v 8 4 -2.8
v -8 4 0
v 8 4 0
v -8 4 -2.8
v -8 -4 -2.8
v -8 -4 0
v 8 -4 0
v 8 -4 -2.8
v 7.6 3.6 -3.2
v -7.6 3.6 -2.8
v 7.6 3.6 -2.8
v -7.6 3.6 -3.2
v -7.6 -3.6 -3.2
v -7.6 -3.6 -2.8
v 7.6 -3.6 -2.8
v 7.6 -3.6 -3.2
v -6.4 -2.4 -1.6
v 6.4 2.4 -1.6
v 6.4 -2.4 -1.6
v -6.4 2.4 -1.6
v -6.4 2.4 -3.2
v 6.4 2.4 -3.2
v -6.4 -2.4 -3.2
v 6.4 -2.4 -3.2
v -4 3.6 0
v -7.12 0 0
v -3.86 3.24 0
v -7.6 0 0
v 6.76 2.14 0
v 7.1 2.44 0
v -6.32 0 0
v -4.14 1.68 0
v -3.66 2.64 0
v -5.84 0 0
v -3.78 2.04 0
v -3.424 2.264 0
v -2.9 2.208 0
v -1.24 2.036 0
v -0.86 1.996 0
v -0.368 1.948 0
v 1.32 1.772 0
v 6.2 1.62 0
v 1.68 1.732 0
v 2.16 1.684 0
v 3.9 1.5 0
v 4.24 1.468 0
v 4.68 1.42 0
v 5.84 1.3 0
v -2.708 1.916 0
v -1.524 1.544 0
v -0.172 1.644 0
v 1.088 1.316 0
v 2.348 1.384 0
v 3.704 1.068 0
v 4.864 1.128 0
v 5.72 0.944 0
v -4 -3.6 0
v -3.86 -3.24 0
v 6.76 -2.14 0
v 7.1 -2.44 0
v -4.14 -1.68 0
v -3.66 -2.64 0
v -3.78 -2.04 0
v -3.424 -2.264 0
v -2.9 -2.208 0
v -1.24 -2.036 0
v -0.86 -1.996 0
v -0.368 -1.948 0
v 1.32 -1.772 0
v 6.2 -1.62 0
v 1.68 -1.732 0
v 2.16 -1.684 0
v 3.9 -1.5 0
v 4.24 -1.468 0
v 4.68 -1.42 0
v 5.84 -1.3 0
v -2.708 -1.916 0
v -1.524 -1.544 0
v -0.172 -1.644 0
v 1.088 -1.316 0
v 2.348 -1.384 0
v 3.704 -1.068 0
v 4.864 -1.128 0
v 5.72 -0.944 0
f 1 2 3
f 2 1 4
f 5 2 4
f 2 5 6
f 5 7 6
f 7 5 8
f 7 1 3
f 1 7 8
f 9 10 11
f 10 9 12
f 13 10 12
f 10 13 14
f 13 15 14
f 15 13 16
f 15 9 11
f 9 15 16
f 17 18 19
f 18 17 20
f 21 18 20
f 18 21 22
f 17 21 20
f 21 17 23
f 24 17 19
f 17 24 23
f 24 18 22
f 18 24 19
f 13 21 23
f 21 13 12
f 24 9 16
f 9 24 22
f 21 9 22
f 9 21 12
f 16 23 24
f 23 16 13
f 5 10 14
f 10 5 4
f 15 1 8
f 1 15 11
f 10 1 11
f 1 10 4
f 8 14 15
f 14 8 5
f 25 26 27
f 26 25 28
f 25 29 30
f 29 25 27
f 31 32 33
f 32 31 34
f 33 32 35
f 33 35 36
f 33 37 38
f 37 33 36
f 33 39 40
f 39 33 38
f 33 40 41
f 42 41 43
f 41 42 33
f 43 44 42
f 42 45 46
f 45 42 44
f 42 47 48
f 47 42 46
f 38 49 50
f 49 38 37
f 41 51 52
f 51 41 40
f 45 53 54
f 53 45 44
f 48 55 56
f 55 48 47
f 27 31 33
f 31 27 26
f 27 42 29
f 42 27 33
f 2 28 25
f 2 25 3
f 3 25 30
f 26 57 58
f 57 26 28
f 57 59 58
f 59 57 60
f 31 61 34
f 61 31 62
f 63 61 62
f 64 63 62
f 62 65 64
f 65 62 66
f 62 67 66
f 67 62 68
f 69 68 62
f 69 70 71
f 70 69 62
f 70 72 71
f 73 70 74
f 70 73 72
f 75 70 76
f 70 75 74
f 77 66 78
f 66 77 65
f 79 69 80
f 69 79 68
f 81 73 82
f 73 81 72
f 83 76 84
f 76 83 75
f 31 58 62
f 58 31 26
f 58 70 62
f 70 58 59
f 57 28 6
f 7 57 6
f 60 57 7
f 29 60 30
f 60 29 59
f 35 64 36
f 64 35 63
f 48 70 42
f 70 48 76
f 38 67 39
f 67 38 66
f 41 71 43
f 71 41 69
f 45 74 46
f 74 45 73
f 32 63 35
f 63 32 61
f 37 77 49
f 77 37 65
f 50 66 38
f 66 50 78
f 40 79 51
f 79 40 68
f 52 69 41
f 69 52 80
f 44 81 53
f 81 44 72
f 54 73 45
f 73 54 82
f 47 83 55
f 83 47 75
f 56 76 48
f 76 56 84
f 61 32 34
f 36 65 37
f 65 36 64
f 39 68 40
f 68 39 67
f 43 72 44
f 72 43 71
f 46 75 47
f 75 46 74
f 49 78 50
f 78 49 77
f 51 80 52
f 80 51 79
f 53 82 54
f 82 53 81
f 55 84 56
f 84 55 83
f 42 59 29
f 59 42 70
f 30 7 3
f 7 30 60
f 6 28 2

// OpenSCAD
// file: ../p/box5.scad
use <../lib.scad>
function ldraw_lib__box5() = [
// 0 Box with 5 Faces and All Edges
// 0 Name: box5.dat
// 0 Author: James Jessiman
// 0 !LDRAW_ORG Primitive UPDATE 2012-01
// 0 !LICENSE Licensed under CC BY 4.0 : see CAreadme.txt
// 
// 0 BFC CERTIFY CCW
  [0,"BFC","CERTIFY"],
  [0,"BFC","CCW"],
// 
// 0 !HISTORY 2002-04-03 [sbliss] Modified for BFC compliance
// 0 !HISTORY 2002-04-25 [PTadmin] Official Update 2002-02
// 0 !HISTORY 2007-06-24 [PTadmin] Header formatted for Contributor Agreement
// 0 !HISTORY 2008-07-01 [PTadmin] Official Update 2008-01
// 0 !HISTORY 2012-02-16 [Philo] Changed to CCW
// 0 !HISTORY 2012-03-30 [PTadmin] Official Update 2012-01
// 
// 
// 2 24 1 1 1 -1 1 1
  [2,24,1,1,1,-1,1,1],
// 2 24 -1 1 1 -1 1 -1
  [2,24,-1,1,1,-1,1,-1],
// 2 24 -1 1 -1 1 1 -1
  [2,24,-1,1,-1,1,1,-1],
// 2 24 1 1 -1 1 1 1
  [2,24,1,1,-1,1,1,1],
// 2 24 1 0 1 -1 0 1
  [2,24,1,0,1,-1,0,1],
// 2 24 -1 0 1 -1 0 -1
  [2,24,-1,0,1,-1,0,-1],
// 2 24 -1 0 -1 1 0 -1
  [2,24,-1,0,-1,1,0,-1],
// 2 24 1 0 -1 1 0 1
  [2,24,1,0,-1,1,0,1],
// 2 24 1 0 1 1 1 1
  [2,24,1,0,1,1,1,1],
// 2 24 -1 0 1 -1 1 1
  [2,24,-1,0,1,-1,1,1],
// 2 24 1 0 -1 1 1 -1
  [2,24,1,0,-1,1,1,-1],
// 2 24 -1 0 -1 -1 1 -1
  [2,24,-1,0,-1,-1,1,-1],
// 4 16 -1 1 1 1 1 1 1 1 -1 -1 1 -1
  [4,16,-1,1,1,1,1,1,1,1,-1,-1,1,-1],
// 4 16 -1 1 1 -1 0 1 1 0 1 1 1 1
  [4,16,-1,1,1,-1,0,1,1,0,1,1,1,1],
// 4 16 -1 1 -1 -1 0 -1 -1 0 1 -1 1 1
  [4,16,-1,1,-1,-1,0,-1,-1,0,1,-1,1,1],
// 4 16 1 1 -1 1 0 -1 -1 0 -1 -1 1 -1
  [4,16,1,1,-1,1,0,-1,-1,0,-1,-1,1,-1],
// 4 16 1 1 1 1 0 1 1 0 -1 1 1 -1
  [4,16,1,1,1,1,0,1,1,0,-1,1,1,-1],
];
module ldraw_lib__box5(step=0, col=false, unit=2/5, alt=false, line=0.2, solid=!$preview)
    makepoly(ldraw_lib__box5(), step=step, col=col, unit=unit, alt=alt, line=line, solid=solid);
ldraw_lib__box5(line=0.2);
// file: ../p/box4.scad
use <../lib.scad>
function ldraw_lib__box4() = [
// 0 Box with 4 Faces (2 Parallel Pairs) and All Edges
// 0 Name: box4.dat
// 0 Author: James Jessiman
// 0 !LDRAW_ORG Primitive UPDATE 2012-01
// 0 !LICENSE Licensed under CC BY 4.0 : see CAreadme.txt
// 
// 0 BFC CERTIFY CCW
  [0,"BFC","CERTIFY"],
  [0,"BFC","CCW"],
// 
// 0 !HISTORY 2002-04-03 [sbliss] Modified for BFC compliance
// 0 !HISTORY 2002-04-25 [PTadmin] Official Update 2002-02
// 0 !HISTORY 2007-06-24 [PTadmin] Header formatted for Contributor Agreement
// 0 !HISTORY 2008-07-01 [PTadmin] Official Update 2008-01
// 0 !HISTORY 2012-02-16 [Philo] Changed to CCW
// 0 !HISTORY 2012-03-30 [PTadmin] Official Update 2012-01
// 
// 
// 2 24 1 1 1 -1 1 1
  [2,24,1,1,1,-1,1,1],
// 2 24 -1 1 1 -1 1 -1
  [2,24,-1,1,1,-1,1,-1],
// 2 24 -1 1 -1 1 1 -1
  [2,24,-1,1,-1,1,1,-1],
// 2 24 1 1 -1 1 1 1
  [2,24,1,1,-1,1,1,1],
// 2 24 1 0 1 -1 0 1
  [2,24,1,0,1,-1,0,1],
// 2 24 -1 0 1 -1 0 -1
  [2,24,-1,0,1,-1,0,-1],
// 2 24 -1 0 -1 1 0 -1
  [2,24,-1,0,-1,1,0,-1],
// 2 24 1 0 -1 1 0 1
  [2,24,1,0,-1,1,0,1],
// 2 24 1 0 1 1 1 1
  [2,24,1,0,1,1,1,1],
// 2 24 -1 0 1 -1 1 1
  [2,24,-1,0,1,-1,1,1],
// 2 24 1 0 -1 1 1 -1
  [2,24,1,0,-1,1,1,-1],
// 2 24 -1 0 -1 -1 1 -1
  [2,24,-1,0,-1,-1,1,-1],
// 4 16 -1 1 1 -1 0 1 1 0 1 1 1 1
  [4,16,-1,1,1,-1,0,1,1,0,1,1,1,1],
// 4 16 -1 1 -1 -1 0 -1 -1 0 1 -1 1 1
  [4,16,-1,1,-1,-1,0,-1,-1,0,1,-1,1,1],
// 4 16 1 1 -1 1 0 -1 -1 0 -1 -1 1 -1
  [4,16,1,1,-1,1,0,-1,-1,0,-1,-1,1,-1],
// 4 16 1 1 1 1 0 1 1 0 -1 1 1 -1
  [4,16,1,1,1,1,0,1,1,0,-1,1,1,-1],
];
module ldraw_lib__box4(step=0, col=false, unit=2/5, alt=false, line=0.2, solid=!$preview)
    makepoly(ldraw_lib__box4(), step=step, col=col, unit=unit, alt=alt, line=line, solid=solid);
ldraw_lib__box4(line=0.2);
// file: s/3069bs01.scad
use <../../lib.scad>
use <../../p/box4.scad>
use <../../p/box5.scad>
function ldraw_lib__s__3069bs01() = [
// 0 ~Tile  1 x  2 with Groove without Top Face
// 0 Name: s\3069bs01.dat
// 0 Author: Santeri Piippo [arezey]
// 0 !LDRAW_ORG Subpart UPDATE 2010-02
// 0 !LICENSE Licensed under CC BY 4.0 : see CAreadme.txt
// 
// 0 BFC CERTIFY CCW
  [0,"BFC","CERTIFY"],
  [0,"BFC","CCW"],
// 
// 0 !HISTORY 2010-07-05 [PTadmin] Official Update 2010-02
// 
// 
// 1 16 0 0 0 20 0 0 0 7 0 0 0 10 box4.dat
  [1,16,0,0,0,20,0,0,0,7,0,0,0,10, ldraw_lib__box4()],
// 1 16 0 7 0 19 0 0 0 1 0 0 0 9 box4.dat
  [1,16,0,7,0,19,0,0,0,1,0,0,0,9, ldraw_lib__box4()],
// 0 BFC INVERTNEXT
  [0,"BFC","INVERTNEXT"],
// 1 16 0 8 0 16 0 0 0 -4 0 0 0 6 box5.dat
  [1,16,0,8,0,16,0,0,0,-4,0,0,0,6, ldraw_lib__box5()],
// 4 16 -19 8 9 -16 8 6 -16 8 -6 -19 8 -9
  [4,16,-19,8,9,-16,8,6,-16,8,-6,-19,8,-9],
// 4 16 19 8 -9 16 8 -6 16 8 6 19 8 9
  [4,16,19,8,-9,16,8,-6,16,8,6,19,8,9],
// 4 16 19 8 9 16 8 6 -16 8 6 -19 8 9
  [4,16,19,8,9,16,8,6,-16,8,6,-19,8,9],
// 4 16 -19 8 -9 -16 8 -6 16 8 -6 19 8 -9
  [4,16,-19,8,-9,-16,8,-6,16,8,-6,19,8,-9],
// 4 16 -20 7 10 -19 7 9 -19 7 -9 -20 7 -10
  [4,16,-20,7,10,-19,7,9,-19,7,-9,-20,7,-10],
// 4 16 20 7 -10 19 7 -9 19 7 9 20 7 10
  [4,16,20,7,-10,19,7,-9,19,7,9,20,7,10],
// 4 16 20 7 10 19 7 9 -19 7 9 -20 7 10
  [4,16,20,7,10,19,7,9,-19,7,9,-20,7,10],
// 4 16 -20 7 -10 -19 7 -9 19 7 -9 20 7 -10
  [4,16,-20,7,-10,-19,7,-9,19,7,-9,20,7,-10],
// 0 //
];
module ldraw_lib__s__3069bs01(step=0, col=false, unit=2/5, alt=false, line=0.2, solid=!$preview)
    makepoly(ldraw_lib__s__3069bs01(), step=step, col=col, unit=unit, alt=alt, line=line, solid=solid);
ldraw_lib__s__3069bs01(line=0.2);
// file: s/3069bp0os01.scad
use <../../lib.scad>
function ldraw_lib__s__3069bp0os01() = [
// 0 ~Tile  1 x  2 with Black Pentagonal Outlines and Light Bluish Grey and Dark Bluish Grey Vents Pattern - Half
// 0 Name: s\3069bp0os01.dat
// 0 Author: Vincent Messenet [Cheenzo]
// 0 !LDRAW_ORG Subpart UPDATE 2024-05
// 0 !LICENSE Licensed under CC BY 4.0 : see CAreadme.txt
// 
// 0 BFC CERTIFY CCW
  [0,"BFC","CERTIFY"],
  [0,"BFC","CCW"],
// 
// 0 !HISTORY 2024-06-30 [OrionP] Official Update 2024-05
// 
// 
// 4 0 -19 0 0 -17.8 0 0 -9.65 0 8.1 -10 0 9
  [4,0,-19,0,0,-17.8,0,0,-9.65,0,8.1,-10,0,9],
// 4 0 -10 0 9 -9.65 0 8.1 16.9 0 5.35 17.75 0 6.1
  [4,0,-10,0,9,-9.65,0,8.1,16.9,0,5.35,17.75,0,6.1],
// 4 0 -15.8 0 0 -14.6 0 0 -10.35 0 4.2 -9.15 0 6.6
  [4,0,-15.8,0,0,-14.6,0,0,-10.35,0,4.2,-9.15,0,6.6],
// 3 0 -9.15 0 6.6 -10.35 0 4.2 -9.45 0 5.1
  [3,0,-9.15,0,6.6,-10.35,0,4.2,-9.45,0,5.1],
// 3 0 -9.15 0 6.6 -9.45 0 5.1 -8.56 0 5.66
  [3,0,-9.15,0,6.6,-9.45,0,5.1,-8.56,0,5.66],
// 4 0 -8.56 0 5.66 -7.25 0 5.52 -3.1 0 5.09 -9.15 0 6.6
  [4,0,-8.56,0,5.66,-7.25,0,5.52,-3.1,0,5.09,-9.15,0,6.6],
// 4 0 -.92 0 4.87 -9.15 0 6.6 -3.1 0 5.09 -2.15 0 4.99
  [4,0,-.92,0,4.87,-9.15,0,6.6,-3.1,0,5.09,-2.15,0,4.99],
// 3 0 -9.15 0 6.6 -.92 0 4.87 3.3 0 4.43
  [3,0,-9.15,0,6.6,-.92,0,4.87,3.3,0,4.43],
// 4 0 -9.15 0 6.6 3.3 0 4.43 4.2 0 4.33 15.5 0 4.05
  [4,0,-9.15,0,6.6,3.3,0,4.43,4.2,0,4.33,15.5,0,4.05],
// 3 0 4.2 0 4.33 5.4 0 4.21 15.5 0 4.05
  [3,0,4.2,0,4.33,5.4,0,4.21,15.5,0,4.05],
// 4 0 10.6 0 3.67 15.5 0 4.05 5.4 0 4.21 9.75 0 3.75
  [4,0,10.6,0,3.67,15.5,0,4.05,5.4,0,4.21,9.75,0,3.75],
// 4 0 10.6 0 3.67 11.7 0 3.55 14.6 0 3.25 15.5 0 4.05
  [4,0,10.6,0,3.67,11.7,0,3.55,14.6,0,3.25,15.5,0,4.05],
// 4 72 -7.25 0 5.52 -6.77 0 4.79 -3.81 0 3.86 -3.1 0 5.09
  [4,72,-7.25,0,5.52,-6.77,0,4.79,-3.81,0,3.86,-3.1,0,5.09],
// 4 72 -.92 0 4.87 -.43 0 4.11 2.72 0 3.29 3.3 0 4.43
  [4,72,-.92,0,4.87,-.43,0,4.11,2.72,0,3.29,3.3,0,4.43],
// 4 72 9.75 0 3.75 5.4 0 4.21 5.87 0 3.46 9.26 0 2.67
  [4,72,9.75,0,3.75,5.4,0,4.21,5.87,0,3.46,9.26,0,2.67],
// 4 72 11.7 0 3.55 12.16 0 2.82 14.3 0 2.36 14.6 0 3.25
  [4,72,11.7,0,3.55,12.16,0,2.82,14.3,0,2.36,14.6,0,3.25],
// 4 16 -17.8 0 0 -15.8 0 0 -9.15 0 6.6 -9.65 0 8.1
  [4,16,-17.8,0,0,-15.8,0,0,-9.15,0,6.6,-9.65,0,8.1],
// 4 16 -9.65 0 8.1 -9.15 0 6.6 15.5 0 4.05 16.9 0 5.35
  [4,16,-9.65,0,8.1,-9.15,0,6.6,15.5,0,4.05,16.9,0,5.35],
// 3 16 -20 0 10 -19 0 0 -10 0 9
  [3,16,-20,0,10,-19,0,0,-10,0,9],
// 3 16 -20 0 10 -10 0 9 20 0 10
  [3,16,-20,0,10,-10,0,9,20,0,10],
// 3 16 20 0 10 -10 0 9 17.75 0 6.1
  [3,16,20,0,10,-10,0,9,17.75,0,6.1],
];
module ldraw_lib__s__3069bp0os01(step=0, col=false, unit=2/5, alt=false, line=0.2, solid=!$preview)
    makepoly(ldraw_lib__s__3069bp0os01(), step=step, col=col, unit=unit, alt=alt, line=line, solid=solid);
ldraw_lib__s__3069bp0os01(line=0.2);
// main file
use <../lib.scad>
use <s/3069bp0os01.scad>
use <s/3069bs01.scad>
function ldraw_lib__3069bp0o() = [
// 0 Tile  1 x  2 with Black Pentagonal Outlines and Light Bluish Grey and Dark Bluish Grey Vents Pattern
// 0 Name: 3069bp0o.dat
// 0 Author: Vincent Messenet [Cheenzo]
// 0 !LDRAW_ORG Part UPDATE 2024-05
// 0 !LICENSE Licensed under CC BY 4.0 : see CAreadme.txt
// 
// 0 BFC CERTIFY CCW
  [0,"BFC","CERTIFY"],
  [0,"BFC","CCW"],
// 
// 0 !KEYWORDS Bricklink 3069bpb1082, BrickOwl 1097905, Optimus Prime
// 0 !KEYWORDS Rebrickable 3069bpr0352, Set 10302
// 
// 0 !HISTORY 2024-06-30 [OrionP] Official Update 2024-05
// 
// 
// 1 16 0 0 0 1 0 0 0 1 0 0 0 1 s\3069bs01.dat
  [1,16,0,0,0,1,0,0,0,1,0,0,0,1, ldraw_lib__s__3069bs01()],
// 1 16 0 0 0 1 0 0 0 1 0 0 0 1 s\3069bp0os01.dat
  [1,16,0,0,0,1,0,0,0,1,0,0,0,1, ldraw_lib__s__3069bp0os01()],
// 1 16 0 0 0 1 0 0 0 1 0 0 0 -1 s\3069bp0os01.dat
  [1,16,0,0,0,1,0,0,0,1,0,0,0,-1, ldraw_lib__s__3069bp0os01()],
// 
// 4 0 16.9 0 5.35 16.9 0 -5.35 17.75 0 -6.1 17.75 0 6.1
  [4,0,16.9,0,5.35,16.9,0,-5.35,17.75,0,-6.1,17.75,0,6.1],
// 4 0 -9.45 0 5.1 -9.45 0 -5.1 -8.56 0 -5.66 -8.56 0 5.66
  [4,0,-9.45,0,5.1,-9.45,0,-5.1,-8.56,0,-5.66,-8.56,0,5.66],
// 4 0 15.5 0 4.05 14.6 0 3.25 14.6 0 -3.25 15.5 0 -4.05
  [4,0,15.5,0,4.05,14.6,0,3.25,14.6,0,-3.25,15.5,0,-4.05],
// 4 0 -2.15 0 -4.99 -2.15 0 4.99 -3.1 0 5.09 -3.1 0 -5.09
  [4,0,-2.15,0,-4.99,-2.15,0,4.99,-3.1,0,5.09,-3.1,0,-5.09],
// 4 0 4.2 0 -4.33 4.2 0 4.33 3.3 0 4.43 3.3 0 -4.43
  [4,0,4.2,0,-4.33,4.2,0,4.33,3.3,0,4.43,3.3,0,-4.43],
// 4 0 10.6 0 -3.67 10.6 0 3.67 9.75 0 3.75 9.75 0 -3.75
  [4,0,10.6,0,-3.67,10.6,0,3.67,9.75,0,3.75,9.75,0,-3.75],
// 4 72 -9.45 0 -5.1 -9.45 0 5.1 -10.35 0 4.2 -10.35 0 -4.2
  [4,72,-9.45,0,-5.1,-9.45,0,5.1,-10.35,0,4.2,-10.35,0,-4.2],
// 4 72 -6.77 0 -4.79 -6.77 0 4.79 -7.25 0 5.52 -7.25 0 -5.52
  [4,72,-6.77,0,-4.79,-6.77,0,4.79,-7.25,0,5.52,-7.25,0,-5.52],
// 4 72 -3.1 0 5.09 -3.81 0 3.86 -3.81 0 -3.86 -3.1 0 -5.09
  [4,72,-3.1,0,5.09,-3.81,0,3.86,-3.81,0,-3.86,-3.1,0,-5.09],
// 4 72 -.43 0 -4.11 -.43 0 4.11 -.92 0 4.87 -.92 0 -4.87
  [4,72,-.43,0,-4.11,-.43,0,4.11,-.92,0,4.87,-.92,0,-4.87],
// 4 72 3.3 0 4.43 2.72 0 3.29 2.72 0 -3.29 3.3 0 -4.43
  [4,72,3.3,0,4.43,2.72,0,3.29,2.72,0,-3.29,3.3,0,-4.43],
// 4 72 5.87 0 -3.46 5.87 0 3.46 5.4 0 4.21 5.4 0 -4.21
  [4,72,5.87,0,-3.46,5.87,0,3.46,5.4,0,4.21,5.4,0,-4.21],
// 4 72 9.75 0 3.75 9.26 0 2.67 9.26 0 -2.67 9.75 0 -3.75
  [4,72,9.75,0,3.75,9.26,0,2.67,9.26,0,-2.67,9.75,0,-3.75],
// 4 72 12.16 0 -2.82 12.16 0 2.82 11.7 0 3.55 11.7 0 -3.55
  [4,72,12.16,0,-2.82,12.16,0,2.82,11.7,0,3.55,11.7,0,-3.55],
// 4 72 14.6 0 3.25 14.3 0 2.36 14.3 0 -2.36 14.6 0 -3.25
  [4,72,14.6,0,3.25,14.3,0,2.36,14.3,0,-2.36,14.6,0,-3.25],
// 3 71 -10.35 0 -4.2 -10.35 0 4.2 -14.6 0 0
  [3,71,-10.35,0,-4.2,-10.35,0,4.2,-14.6,0,0],
// 4 71 -7.25 0 -5.52 -7.25 0 5.52 -8.56 0 5.66 -8.56 0 -5.66
  [4,71,-7.25,0,-5.52,-7.25,0,5.52,-8.56,0,5.66,-8.56,0,-5.66],
// 4 71 -.92 0 -4.87 -.92 0 4.87 -2.15 0 4.99 -2.15 0 -4.99
  [4,71,-.92,0,-4.87,-.92,0,4.87,-2.15,0,4.99,-2.15,0,-4.99],
// 4 71 5.4 0 -4.21 5.4 0 4.21 4.2 0 4.33 4.2 0 -4.33
  [4,71,5.4,0,-4.21,5.4,0,4.21,4.2,0,4.33,4.2,0,-4.33],
// 4 71 11.7 0 -3.55 11.7 0 3.55 10.6 0 3.67 10.6 0 -3.67
  [4,71,11.7,0,-3.55,11.7,0,3.55,10.6,0,3.67,10.6,0,-3.67],
// 4 71 -3.81 0 -3.86 -3.81 0 3.86 -6.77 0 4.79 -6.77 0 -4.79
  [4,71,-3.81,0,-3.86,-3.81,0,3.86,-6.77,0,4.79,-6.77,0,-4.79],
// 4 71 2.72 0 -3.29 2.72 0 3.29 -.43 0 4.11 -.43 0 -4.11
  [4,71,2.72,0,-3.29,2.72,0,3.29,-.43,0,4.11,-.43,0,-4.11],
// 4 71 9.26 0 -2.67 9.26 0 2.67 5.87 0 3.46 5.87 0 -3.46
  [4,71,9.26,0,-2.67,9.26,0,2.67,5.87,0,3.46,5.87,0,-3.46],
// 4 71 14.3 0 -2.36 14.3 0 2.36 12.16 0 2.82 12.16 0 -2.82
  [4,71,14.3,0,-2.36,14.3,0,2.36,12.16,0,2.82,12.16,0,-2.82],
// 4 16 16.9 0 5.35 15.5 0 4.05 15.5 0 -4.05 16.9 0 -5.35
  [4,16,16.9,0,5.35,15.5,0,4.05,15.5,0,-4.05,16.9,0,-5.35],
// 4 16 20 0 10 17.75 0 6.1 17.75 0 -6.1 20 0 -10
  [4,16,20,0,10,17.75,0,6.1,17.75,0,-6.1,20,0,-10],
// 3 16 -20 0 -10 -19 0 0 -20 0 10
  [3,16,-20,0,-10,-19,0,0,-20,0,10],
];
module ldraw_lib__3069bp0o(step=0, col=false, unit=2/5, alt=false, line=0.2, solid=!$preview)
    makepoly(ldraw_lib__3069bp0o(), step=step, col=col, unit=unit, alt=alt, line=line, solid=solid);
ldraw_lib__3069bp0o(line=0.2);
